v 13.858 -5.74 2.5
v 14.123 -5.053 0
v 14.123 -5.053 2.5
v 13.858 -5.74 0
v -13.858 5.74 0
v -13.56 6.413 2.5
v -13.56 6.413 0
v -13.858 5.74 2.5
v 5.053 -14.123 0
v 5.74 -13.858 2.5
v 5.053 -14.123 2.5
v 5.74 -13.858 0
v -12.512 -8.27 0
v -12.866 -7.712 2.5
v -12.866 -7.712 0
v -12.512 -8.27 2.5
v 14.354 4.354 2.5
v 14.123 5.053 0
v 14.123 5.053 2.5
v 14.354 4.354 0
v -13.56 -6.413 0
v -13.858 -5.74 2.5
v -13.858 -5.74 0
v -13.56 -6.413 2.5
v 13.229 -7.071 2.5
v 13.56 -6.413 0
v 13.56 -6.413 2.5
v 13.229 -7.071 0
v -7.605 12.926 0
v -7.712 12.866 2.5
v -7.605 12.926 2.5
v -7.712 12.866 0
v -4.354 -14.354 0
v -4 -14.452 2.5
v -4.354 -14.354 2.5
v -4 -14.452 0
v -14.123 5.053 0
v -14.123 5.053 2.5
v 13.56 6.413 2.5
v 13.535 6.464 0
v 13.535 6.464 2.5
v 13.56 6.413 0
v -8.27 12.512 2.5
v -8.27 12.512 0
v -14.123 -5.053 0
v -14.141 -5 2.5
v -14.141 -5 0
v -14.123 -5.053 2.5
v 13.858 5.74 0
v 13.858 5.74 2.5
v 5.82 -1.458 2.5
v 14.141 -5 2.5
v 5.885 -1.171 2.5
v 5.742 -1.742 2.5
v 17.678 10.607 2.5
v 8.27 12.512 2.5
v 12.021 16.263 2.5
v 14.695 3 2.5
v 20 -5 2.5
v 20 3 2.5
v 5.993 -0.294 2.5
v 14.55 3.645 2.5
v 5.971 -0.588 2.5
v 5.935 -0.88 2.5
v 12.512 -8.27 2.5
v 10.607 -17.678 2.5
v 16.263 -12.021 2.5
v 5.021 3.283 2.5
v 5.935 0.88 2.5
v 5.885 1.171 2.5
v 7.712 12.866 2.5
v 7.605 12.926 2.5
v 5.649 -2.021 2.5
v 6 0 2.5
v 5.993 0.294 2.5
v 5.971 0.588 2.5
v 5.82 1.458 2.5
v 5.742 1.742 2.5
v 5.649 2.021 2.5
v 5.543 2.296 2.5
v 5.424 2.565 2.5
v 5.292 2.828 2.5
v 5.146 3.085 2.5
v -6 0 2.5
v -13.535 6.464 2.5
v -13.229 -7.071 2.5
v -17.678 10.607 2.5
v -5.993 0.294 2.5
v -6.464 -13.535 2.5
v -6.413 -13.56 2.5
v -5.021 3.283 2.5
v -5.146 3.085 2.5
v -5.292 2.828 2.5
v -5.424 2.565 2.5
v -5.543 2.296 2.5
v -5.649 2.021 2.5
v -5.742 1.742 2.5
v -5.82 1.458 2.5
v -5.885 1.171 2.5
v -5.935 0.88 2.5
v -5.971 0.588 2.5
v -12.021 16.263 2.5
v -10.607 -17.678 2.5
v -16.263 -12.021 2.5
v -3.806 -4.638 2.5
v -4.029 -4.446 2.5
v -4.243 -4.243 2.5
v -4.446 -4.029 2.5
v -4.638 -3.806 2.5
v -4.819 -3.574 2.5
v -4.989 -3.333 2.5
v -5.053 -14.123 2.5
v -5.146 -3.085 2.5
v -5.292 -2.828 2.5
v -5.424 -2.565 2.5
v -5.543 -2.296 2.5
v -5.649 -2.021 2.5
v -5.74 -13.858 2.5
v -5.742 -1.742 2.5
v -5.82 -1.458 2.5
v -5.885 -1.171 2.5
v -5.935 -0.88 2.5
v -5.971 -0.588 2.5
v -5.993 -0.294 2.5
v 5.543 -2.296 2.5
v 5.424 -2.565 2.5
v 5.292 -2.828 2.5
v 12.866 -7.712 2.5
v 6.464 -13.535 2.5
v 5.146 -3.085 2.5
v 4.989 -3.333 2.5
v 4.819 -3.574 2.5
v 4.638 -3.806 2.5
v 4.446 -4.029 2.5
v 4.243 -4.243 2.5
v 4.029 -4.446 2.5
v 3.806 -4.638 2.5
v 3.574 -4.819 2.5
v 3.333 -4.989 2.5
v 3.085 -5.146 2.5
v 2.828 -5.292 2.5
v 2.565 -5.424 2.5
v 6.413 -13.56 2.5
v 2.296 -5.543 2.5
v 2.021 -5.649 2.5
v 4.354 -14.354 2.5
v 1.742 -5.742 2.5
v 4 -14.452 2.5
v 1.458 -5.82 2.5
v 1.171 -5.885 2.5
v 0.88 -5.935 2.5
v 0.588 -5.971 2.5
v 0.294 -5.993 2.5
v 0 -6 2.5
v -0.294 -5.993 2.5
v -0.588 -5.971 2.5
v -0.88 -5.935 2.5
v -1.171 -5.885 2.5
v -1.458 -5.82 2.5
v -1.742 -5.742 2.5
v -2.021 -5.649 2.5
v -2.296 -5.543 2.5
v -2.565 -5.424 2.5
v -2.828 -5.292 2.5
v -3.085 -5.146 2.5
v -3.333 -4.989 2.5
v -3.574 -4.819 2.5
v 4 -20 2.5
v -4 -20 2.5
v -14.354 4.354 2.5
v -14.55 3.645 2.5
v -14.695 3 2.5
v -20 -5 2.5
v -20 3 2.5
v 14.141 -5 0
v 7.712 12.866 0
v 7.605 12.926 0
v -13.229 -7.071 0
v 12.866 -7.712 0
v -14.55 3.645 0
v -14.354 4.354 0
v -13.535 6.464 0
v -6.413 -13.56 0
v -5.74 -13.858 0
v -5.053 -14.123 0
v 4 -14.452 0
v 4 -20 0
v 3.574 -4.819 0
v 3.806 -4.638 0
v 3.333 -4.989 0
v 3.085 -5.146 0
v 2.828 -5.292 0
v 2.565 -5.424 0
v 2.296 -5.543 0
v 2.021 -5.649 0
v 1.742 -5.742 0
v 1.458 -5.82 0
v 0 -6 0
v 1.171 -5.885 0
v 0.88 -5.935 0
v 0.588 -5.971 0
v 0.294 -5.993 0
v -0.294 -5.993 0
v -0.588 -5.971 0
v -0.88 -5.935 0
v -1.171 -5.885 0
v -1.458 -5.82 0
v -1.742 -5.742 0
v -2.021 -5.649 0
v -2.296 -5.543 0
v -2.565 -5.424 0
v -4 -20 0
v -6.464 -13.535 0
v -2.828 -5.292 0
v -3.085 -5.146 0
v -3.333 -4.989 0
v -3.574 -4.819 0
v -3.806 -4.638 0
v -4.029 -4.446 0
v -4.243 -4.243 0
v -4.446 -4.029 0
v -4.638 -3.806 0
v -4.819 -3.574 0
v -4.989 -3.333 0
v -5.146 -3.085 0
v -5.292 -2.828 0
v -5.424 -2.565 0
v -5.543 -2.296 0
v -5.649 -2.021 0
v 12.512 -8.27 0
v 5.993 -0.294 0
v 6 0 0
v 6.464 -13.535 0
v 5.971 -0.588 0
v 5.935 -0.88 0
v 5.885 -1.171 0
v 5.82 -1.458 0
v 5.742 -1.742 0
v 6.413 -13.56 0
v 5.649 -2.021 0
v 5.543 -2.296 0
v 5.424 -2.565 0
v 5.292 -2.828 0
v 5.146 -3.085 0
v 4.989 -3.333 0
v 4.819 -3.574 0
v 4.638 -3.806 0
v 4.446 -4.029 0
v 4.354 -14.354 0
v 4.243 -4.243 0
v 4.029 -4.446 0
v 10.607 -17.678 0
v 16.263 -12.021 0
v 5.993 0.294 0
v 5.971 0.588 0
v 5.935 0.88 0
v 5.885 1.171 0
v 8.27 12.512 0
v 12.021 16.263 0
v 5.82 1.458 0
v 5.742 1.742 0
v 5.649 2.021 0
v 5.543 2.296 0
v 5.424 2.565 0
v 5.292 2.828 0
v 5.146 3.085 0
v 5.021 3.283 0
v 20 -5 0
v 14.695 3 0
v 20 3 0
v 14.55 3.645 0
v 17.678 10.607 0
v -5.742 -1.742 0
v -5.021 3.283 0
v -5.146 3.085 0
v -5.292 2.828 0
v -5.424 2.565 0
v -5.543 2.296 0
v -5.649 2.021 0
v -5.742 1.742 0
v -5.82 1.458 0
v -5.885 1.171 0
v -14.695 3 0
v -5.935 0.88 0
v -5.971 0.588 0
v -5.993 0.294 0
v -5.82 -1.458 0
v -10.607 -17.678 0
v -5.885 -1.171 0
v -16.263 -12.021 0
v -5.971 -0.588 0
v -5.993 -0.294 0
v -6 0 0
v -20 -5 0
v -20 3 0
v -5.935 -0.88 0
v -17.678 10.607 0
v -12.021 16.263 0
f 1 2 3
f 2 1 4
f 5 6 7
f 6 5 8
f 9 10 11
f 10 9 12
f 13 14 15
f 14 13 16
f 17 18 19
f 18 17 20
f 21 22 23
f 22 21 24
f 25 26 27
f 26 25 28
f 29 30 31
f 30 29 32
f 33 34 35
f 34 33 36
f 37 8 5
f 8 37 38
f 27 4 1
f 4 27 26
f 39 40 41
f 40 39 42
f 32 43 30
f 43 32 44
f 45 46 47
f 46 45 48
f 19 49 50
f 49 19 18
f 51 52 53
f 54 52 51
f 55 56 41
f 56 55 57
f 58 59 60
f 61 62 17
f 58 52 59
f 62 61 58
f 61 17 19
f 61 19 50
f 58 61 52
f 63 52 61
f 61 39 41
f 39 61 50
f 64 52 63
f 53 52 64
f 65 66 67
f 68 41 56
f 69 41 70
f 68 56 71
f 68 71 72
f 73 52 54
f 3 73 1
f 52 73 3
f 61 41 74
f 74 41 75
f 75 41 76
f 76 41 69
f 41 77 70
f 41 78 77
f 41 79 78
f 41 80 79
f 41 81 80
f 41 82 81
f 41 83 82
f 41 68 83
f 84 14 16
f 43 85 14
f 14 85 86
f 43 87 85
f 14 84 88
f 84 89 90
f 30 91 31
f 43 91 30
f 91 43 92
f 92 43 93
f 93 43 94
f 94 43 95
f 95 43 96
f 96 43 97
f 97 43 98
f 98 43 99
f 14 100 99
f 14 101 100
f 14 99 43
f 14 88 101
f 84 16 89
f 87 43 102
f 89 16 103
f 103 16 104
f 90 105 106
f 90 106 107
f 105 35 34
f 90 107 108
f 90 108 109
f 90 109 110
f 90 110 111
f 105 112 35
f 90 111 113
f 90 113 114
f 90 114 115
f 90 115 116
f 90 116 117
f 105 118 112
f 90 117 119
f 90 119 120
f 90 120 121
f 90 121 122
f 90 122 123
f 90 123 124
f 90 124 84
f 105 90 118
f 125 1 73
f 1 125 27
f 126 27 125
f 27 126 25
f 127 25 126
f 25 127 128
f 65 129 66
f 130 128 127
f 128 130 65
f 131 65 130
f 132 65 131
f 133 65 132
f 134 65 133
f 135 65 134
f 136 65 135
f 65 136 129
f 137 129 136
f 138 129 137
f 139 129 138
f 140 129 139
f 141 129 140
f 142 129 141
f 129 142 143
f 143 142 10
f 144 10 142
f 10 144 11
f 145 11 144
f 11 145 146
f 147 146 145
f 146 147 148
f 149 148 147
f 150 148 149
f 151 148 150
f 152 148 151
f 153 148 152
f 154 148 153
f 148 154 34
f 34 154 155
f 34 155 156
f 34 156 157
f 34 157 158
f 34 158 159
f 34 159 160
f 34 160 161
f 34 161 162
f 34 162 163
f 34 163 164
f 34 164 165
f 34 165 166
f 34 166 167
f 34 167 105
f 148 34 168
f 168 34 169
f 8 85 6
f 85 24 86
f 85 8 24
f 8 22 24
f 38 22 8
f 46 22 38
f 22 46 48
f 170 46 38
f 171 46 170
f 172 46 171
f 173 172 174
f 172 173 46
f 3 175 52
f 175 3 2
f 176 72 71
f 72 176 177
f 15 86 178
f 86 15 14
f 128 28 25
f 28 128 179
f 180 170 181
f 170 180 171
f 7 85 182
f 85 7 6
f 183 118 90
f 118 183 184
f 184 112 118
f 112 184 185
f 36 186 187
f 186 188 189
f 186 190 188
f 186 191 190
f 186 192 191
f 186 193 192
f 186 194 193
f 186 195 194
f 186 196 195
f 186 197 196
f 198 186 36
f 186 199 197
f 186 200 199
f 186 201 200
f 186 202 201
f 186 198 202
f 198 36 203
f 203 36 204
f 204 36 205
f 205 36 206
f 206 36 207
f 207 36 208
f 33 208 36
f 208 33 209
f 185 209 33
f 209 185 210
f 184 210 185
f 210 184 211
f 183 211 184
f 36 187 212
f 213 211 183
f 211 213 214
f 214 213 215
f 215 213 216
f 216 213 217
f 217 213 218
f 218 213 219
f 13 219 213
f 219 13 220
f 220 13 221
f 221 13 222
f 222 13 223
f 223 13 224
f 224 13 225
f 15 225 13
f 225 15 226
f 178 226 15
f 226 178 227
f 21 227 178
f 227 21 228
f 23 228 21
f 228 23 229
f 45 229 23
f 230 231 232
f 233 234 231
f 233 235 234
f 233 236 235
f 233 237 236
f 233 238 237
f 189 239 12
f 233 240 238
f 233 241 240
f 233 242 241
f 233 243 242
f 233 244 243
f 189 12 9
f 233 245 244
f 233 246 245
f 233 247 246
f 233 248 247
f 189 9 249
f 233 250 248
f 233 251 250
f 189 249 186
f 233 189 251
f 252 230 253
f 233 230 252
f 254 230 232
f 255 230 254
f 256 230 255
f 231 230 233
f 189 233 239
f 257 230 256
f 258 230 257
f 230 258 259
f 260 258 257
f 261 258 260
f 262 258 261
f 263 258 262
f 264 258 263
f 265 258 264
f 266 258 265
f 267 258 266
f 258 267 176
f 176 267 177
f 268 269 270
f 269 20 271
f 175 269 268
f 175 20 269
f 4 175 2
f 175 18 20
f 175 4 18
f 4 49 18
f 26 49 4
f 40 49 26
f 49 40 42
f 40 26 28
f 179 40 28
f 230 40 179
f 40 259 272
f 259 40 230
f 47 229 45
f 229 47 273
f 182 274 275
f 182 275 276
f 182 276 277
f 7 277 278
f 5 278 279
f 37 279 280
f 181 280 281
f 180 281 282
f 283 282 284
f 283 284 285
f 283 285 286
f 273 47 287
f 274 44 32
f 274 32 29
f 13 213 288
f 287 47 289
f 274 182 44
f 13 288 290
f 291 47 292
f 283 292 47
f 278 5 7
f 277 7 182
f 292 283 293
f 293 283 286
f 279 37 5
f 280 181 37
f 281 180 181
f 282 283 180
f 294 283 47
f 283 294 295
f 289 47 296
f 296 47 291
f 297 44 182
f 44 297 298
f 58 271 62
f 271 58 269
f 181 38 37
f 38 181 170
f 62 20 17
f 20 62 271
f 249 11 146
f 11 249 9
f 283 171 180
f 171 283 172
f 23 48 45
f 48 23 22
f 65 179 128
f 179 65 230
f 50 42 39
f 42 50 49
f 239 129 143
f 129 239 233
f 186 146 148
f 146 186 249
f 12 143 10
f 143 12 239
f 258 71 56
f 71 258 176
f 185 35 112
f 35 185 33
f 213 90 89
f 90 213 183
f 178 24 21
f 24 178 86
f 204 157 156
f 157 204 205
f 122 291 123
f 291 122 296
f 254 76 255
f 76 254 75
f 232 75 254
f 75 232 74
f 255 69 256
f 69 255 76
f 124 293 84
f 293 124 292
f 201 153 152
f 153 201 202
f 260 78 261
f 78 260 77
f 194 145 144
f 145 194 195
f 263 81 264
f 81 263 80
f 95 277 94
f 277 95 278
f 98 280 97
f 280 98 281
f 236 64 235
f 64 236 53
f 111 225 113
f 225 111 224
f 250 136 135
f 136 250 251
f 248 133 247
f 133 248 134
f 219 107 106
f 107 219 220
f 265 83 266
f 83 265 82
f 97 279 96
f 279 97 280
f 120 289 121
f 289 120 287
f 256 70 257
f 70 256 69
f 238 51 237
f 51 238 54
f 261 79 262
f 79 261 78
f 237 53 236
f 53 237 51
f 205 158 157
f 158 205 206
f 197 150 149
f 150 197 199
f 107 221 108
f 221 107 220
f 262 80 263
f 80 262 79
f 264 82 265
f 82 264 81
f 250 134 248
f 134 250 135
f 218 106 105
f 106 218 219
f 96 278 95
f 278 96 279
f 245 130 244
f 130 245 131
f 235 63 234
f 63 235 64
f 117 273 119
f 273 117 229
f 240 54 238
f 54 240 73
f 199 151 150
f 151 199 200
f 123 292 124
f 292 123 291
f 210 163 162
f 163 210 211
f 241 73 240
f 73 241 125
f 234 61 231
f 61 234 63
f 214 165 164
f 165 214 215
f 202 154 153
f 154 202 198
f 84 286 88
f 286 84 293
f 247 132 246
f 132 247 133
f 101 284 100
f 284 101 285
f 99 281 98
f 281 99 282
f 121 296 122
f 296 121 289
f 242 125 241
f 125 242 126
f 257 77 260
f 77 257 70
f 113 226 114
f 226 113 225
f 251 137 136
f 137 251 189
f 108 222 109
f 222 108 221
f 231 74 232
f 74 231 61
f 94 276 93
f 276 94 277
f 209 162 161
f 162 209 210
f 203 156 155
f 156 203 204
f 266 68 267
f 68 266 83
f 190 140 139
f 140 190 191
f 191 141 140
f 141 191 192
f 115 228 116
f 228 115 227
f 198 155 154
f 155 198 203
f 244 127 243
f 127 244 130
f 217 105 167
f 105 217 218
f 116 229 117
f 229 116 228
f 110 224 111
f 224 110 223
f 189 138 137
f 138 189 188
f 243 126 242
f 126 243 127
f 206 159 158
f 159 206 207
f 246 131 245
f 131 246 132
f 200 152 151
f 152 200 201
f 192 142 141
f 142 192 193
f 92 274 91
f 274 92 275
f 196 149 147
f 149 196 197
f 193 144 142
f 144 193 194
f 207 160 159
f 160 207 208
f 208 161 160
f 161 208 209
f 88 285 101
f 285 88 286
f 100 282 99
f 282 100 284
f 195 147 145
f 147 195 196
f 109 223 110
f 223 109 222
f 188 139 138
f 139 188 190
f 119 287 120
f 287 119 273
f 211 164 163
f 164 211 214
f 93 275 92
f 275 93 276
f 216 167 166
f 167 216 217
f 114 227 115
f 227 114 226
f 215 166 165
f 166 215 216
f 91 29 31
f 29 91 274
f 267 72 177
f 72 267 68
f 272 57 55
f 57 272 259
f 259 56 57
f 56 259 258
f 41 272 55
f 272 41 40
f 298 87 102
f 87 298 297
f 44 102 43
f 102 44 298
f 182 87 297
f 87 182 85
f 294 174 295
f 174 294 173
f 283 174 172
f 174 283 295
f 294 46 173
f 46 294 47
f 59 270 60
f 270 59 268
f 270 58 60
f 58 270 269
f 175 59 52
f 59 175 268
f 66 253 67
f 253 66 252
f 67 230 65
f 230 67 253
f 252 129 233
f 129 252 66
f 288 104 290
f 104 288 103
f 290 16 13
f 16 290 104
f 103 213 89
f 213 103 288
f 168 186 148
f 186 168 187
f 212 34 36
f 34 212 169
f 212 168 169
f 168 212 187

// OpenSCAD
$fn=128;
difference () {
cylinder (2.5,15,15);
translate ([0,0,-1]) cylinder (5,6,6);
translate ([-4,0,-1])cube ([8,50,5]);
rotate ([0,0,15])translate ([-4,0,-1])cube ([8,50,5]);
rotate ([0,0,-15])translate ([-4,0,-1])cube ([8,50,5]);
}
translate ([-20,-5,0])cube ([8,8,2.5]);
translate ([12,-5,0])cube ([8,8,2.5]);
rotate ([0,0,-45])translate ([12,-5,0])cube ([8,8,2.5]);
rotate ([0,0,45])translate ([-20,-5,0])cube ([8,8,2.5]);
translate ([-4,-20,0])cube ([8,8,2.5]);
difference () {
rotate ([0,0,45])translate ([12,-5,0])cube ([8,8,2.5]);
rotate ([0,0,-15])translate ([-4,0,-1])cube ([8,50,5]);
}
difference () {
rotate ([0,0,-45])translate ([-20,-5,0])cube ([8,8,2.5]);
rotate ([0,0,15])translate ([-4,0,-1])cube ([8,50,5]);
}
